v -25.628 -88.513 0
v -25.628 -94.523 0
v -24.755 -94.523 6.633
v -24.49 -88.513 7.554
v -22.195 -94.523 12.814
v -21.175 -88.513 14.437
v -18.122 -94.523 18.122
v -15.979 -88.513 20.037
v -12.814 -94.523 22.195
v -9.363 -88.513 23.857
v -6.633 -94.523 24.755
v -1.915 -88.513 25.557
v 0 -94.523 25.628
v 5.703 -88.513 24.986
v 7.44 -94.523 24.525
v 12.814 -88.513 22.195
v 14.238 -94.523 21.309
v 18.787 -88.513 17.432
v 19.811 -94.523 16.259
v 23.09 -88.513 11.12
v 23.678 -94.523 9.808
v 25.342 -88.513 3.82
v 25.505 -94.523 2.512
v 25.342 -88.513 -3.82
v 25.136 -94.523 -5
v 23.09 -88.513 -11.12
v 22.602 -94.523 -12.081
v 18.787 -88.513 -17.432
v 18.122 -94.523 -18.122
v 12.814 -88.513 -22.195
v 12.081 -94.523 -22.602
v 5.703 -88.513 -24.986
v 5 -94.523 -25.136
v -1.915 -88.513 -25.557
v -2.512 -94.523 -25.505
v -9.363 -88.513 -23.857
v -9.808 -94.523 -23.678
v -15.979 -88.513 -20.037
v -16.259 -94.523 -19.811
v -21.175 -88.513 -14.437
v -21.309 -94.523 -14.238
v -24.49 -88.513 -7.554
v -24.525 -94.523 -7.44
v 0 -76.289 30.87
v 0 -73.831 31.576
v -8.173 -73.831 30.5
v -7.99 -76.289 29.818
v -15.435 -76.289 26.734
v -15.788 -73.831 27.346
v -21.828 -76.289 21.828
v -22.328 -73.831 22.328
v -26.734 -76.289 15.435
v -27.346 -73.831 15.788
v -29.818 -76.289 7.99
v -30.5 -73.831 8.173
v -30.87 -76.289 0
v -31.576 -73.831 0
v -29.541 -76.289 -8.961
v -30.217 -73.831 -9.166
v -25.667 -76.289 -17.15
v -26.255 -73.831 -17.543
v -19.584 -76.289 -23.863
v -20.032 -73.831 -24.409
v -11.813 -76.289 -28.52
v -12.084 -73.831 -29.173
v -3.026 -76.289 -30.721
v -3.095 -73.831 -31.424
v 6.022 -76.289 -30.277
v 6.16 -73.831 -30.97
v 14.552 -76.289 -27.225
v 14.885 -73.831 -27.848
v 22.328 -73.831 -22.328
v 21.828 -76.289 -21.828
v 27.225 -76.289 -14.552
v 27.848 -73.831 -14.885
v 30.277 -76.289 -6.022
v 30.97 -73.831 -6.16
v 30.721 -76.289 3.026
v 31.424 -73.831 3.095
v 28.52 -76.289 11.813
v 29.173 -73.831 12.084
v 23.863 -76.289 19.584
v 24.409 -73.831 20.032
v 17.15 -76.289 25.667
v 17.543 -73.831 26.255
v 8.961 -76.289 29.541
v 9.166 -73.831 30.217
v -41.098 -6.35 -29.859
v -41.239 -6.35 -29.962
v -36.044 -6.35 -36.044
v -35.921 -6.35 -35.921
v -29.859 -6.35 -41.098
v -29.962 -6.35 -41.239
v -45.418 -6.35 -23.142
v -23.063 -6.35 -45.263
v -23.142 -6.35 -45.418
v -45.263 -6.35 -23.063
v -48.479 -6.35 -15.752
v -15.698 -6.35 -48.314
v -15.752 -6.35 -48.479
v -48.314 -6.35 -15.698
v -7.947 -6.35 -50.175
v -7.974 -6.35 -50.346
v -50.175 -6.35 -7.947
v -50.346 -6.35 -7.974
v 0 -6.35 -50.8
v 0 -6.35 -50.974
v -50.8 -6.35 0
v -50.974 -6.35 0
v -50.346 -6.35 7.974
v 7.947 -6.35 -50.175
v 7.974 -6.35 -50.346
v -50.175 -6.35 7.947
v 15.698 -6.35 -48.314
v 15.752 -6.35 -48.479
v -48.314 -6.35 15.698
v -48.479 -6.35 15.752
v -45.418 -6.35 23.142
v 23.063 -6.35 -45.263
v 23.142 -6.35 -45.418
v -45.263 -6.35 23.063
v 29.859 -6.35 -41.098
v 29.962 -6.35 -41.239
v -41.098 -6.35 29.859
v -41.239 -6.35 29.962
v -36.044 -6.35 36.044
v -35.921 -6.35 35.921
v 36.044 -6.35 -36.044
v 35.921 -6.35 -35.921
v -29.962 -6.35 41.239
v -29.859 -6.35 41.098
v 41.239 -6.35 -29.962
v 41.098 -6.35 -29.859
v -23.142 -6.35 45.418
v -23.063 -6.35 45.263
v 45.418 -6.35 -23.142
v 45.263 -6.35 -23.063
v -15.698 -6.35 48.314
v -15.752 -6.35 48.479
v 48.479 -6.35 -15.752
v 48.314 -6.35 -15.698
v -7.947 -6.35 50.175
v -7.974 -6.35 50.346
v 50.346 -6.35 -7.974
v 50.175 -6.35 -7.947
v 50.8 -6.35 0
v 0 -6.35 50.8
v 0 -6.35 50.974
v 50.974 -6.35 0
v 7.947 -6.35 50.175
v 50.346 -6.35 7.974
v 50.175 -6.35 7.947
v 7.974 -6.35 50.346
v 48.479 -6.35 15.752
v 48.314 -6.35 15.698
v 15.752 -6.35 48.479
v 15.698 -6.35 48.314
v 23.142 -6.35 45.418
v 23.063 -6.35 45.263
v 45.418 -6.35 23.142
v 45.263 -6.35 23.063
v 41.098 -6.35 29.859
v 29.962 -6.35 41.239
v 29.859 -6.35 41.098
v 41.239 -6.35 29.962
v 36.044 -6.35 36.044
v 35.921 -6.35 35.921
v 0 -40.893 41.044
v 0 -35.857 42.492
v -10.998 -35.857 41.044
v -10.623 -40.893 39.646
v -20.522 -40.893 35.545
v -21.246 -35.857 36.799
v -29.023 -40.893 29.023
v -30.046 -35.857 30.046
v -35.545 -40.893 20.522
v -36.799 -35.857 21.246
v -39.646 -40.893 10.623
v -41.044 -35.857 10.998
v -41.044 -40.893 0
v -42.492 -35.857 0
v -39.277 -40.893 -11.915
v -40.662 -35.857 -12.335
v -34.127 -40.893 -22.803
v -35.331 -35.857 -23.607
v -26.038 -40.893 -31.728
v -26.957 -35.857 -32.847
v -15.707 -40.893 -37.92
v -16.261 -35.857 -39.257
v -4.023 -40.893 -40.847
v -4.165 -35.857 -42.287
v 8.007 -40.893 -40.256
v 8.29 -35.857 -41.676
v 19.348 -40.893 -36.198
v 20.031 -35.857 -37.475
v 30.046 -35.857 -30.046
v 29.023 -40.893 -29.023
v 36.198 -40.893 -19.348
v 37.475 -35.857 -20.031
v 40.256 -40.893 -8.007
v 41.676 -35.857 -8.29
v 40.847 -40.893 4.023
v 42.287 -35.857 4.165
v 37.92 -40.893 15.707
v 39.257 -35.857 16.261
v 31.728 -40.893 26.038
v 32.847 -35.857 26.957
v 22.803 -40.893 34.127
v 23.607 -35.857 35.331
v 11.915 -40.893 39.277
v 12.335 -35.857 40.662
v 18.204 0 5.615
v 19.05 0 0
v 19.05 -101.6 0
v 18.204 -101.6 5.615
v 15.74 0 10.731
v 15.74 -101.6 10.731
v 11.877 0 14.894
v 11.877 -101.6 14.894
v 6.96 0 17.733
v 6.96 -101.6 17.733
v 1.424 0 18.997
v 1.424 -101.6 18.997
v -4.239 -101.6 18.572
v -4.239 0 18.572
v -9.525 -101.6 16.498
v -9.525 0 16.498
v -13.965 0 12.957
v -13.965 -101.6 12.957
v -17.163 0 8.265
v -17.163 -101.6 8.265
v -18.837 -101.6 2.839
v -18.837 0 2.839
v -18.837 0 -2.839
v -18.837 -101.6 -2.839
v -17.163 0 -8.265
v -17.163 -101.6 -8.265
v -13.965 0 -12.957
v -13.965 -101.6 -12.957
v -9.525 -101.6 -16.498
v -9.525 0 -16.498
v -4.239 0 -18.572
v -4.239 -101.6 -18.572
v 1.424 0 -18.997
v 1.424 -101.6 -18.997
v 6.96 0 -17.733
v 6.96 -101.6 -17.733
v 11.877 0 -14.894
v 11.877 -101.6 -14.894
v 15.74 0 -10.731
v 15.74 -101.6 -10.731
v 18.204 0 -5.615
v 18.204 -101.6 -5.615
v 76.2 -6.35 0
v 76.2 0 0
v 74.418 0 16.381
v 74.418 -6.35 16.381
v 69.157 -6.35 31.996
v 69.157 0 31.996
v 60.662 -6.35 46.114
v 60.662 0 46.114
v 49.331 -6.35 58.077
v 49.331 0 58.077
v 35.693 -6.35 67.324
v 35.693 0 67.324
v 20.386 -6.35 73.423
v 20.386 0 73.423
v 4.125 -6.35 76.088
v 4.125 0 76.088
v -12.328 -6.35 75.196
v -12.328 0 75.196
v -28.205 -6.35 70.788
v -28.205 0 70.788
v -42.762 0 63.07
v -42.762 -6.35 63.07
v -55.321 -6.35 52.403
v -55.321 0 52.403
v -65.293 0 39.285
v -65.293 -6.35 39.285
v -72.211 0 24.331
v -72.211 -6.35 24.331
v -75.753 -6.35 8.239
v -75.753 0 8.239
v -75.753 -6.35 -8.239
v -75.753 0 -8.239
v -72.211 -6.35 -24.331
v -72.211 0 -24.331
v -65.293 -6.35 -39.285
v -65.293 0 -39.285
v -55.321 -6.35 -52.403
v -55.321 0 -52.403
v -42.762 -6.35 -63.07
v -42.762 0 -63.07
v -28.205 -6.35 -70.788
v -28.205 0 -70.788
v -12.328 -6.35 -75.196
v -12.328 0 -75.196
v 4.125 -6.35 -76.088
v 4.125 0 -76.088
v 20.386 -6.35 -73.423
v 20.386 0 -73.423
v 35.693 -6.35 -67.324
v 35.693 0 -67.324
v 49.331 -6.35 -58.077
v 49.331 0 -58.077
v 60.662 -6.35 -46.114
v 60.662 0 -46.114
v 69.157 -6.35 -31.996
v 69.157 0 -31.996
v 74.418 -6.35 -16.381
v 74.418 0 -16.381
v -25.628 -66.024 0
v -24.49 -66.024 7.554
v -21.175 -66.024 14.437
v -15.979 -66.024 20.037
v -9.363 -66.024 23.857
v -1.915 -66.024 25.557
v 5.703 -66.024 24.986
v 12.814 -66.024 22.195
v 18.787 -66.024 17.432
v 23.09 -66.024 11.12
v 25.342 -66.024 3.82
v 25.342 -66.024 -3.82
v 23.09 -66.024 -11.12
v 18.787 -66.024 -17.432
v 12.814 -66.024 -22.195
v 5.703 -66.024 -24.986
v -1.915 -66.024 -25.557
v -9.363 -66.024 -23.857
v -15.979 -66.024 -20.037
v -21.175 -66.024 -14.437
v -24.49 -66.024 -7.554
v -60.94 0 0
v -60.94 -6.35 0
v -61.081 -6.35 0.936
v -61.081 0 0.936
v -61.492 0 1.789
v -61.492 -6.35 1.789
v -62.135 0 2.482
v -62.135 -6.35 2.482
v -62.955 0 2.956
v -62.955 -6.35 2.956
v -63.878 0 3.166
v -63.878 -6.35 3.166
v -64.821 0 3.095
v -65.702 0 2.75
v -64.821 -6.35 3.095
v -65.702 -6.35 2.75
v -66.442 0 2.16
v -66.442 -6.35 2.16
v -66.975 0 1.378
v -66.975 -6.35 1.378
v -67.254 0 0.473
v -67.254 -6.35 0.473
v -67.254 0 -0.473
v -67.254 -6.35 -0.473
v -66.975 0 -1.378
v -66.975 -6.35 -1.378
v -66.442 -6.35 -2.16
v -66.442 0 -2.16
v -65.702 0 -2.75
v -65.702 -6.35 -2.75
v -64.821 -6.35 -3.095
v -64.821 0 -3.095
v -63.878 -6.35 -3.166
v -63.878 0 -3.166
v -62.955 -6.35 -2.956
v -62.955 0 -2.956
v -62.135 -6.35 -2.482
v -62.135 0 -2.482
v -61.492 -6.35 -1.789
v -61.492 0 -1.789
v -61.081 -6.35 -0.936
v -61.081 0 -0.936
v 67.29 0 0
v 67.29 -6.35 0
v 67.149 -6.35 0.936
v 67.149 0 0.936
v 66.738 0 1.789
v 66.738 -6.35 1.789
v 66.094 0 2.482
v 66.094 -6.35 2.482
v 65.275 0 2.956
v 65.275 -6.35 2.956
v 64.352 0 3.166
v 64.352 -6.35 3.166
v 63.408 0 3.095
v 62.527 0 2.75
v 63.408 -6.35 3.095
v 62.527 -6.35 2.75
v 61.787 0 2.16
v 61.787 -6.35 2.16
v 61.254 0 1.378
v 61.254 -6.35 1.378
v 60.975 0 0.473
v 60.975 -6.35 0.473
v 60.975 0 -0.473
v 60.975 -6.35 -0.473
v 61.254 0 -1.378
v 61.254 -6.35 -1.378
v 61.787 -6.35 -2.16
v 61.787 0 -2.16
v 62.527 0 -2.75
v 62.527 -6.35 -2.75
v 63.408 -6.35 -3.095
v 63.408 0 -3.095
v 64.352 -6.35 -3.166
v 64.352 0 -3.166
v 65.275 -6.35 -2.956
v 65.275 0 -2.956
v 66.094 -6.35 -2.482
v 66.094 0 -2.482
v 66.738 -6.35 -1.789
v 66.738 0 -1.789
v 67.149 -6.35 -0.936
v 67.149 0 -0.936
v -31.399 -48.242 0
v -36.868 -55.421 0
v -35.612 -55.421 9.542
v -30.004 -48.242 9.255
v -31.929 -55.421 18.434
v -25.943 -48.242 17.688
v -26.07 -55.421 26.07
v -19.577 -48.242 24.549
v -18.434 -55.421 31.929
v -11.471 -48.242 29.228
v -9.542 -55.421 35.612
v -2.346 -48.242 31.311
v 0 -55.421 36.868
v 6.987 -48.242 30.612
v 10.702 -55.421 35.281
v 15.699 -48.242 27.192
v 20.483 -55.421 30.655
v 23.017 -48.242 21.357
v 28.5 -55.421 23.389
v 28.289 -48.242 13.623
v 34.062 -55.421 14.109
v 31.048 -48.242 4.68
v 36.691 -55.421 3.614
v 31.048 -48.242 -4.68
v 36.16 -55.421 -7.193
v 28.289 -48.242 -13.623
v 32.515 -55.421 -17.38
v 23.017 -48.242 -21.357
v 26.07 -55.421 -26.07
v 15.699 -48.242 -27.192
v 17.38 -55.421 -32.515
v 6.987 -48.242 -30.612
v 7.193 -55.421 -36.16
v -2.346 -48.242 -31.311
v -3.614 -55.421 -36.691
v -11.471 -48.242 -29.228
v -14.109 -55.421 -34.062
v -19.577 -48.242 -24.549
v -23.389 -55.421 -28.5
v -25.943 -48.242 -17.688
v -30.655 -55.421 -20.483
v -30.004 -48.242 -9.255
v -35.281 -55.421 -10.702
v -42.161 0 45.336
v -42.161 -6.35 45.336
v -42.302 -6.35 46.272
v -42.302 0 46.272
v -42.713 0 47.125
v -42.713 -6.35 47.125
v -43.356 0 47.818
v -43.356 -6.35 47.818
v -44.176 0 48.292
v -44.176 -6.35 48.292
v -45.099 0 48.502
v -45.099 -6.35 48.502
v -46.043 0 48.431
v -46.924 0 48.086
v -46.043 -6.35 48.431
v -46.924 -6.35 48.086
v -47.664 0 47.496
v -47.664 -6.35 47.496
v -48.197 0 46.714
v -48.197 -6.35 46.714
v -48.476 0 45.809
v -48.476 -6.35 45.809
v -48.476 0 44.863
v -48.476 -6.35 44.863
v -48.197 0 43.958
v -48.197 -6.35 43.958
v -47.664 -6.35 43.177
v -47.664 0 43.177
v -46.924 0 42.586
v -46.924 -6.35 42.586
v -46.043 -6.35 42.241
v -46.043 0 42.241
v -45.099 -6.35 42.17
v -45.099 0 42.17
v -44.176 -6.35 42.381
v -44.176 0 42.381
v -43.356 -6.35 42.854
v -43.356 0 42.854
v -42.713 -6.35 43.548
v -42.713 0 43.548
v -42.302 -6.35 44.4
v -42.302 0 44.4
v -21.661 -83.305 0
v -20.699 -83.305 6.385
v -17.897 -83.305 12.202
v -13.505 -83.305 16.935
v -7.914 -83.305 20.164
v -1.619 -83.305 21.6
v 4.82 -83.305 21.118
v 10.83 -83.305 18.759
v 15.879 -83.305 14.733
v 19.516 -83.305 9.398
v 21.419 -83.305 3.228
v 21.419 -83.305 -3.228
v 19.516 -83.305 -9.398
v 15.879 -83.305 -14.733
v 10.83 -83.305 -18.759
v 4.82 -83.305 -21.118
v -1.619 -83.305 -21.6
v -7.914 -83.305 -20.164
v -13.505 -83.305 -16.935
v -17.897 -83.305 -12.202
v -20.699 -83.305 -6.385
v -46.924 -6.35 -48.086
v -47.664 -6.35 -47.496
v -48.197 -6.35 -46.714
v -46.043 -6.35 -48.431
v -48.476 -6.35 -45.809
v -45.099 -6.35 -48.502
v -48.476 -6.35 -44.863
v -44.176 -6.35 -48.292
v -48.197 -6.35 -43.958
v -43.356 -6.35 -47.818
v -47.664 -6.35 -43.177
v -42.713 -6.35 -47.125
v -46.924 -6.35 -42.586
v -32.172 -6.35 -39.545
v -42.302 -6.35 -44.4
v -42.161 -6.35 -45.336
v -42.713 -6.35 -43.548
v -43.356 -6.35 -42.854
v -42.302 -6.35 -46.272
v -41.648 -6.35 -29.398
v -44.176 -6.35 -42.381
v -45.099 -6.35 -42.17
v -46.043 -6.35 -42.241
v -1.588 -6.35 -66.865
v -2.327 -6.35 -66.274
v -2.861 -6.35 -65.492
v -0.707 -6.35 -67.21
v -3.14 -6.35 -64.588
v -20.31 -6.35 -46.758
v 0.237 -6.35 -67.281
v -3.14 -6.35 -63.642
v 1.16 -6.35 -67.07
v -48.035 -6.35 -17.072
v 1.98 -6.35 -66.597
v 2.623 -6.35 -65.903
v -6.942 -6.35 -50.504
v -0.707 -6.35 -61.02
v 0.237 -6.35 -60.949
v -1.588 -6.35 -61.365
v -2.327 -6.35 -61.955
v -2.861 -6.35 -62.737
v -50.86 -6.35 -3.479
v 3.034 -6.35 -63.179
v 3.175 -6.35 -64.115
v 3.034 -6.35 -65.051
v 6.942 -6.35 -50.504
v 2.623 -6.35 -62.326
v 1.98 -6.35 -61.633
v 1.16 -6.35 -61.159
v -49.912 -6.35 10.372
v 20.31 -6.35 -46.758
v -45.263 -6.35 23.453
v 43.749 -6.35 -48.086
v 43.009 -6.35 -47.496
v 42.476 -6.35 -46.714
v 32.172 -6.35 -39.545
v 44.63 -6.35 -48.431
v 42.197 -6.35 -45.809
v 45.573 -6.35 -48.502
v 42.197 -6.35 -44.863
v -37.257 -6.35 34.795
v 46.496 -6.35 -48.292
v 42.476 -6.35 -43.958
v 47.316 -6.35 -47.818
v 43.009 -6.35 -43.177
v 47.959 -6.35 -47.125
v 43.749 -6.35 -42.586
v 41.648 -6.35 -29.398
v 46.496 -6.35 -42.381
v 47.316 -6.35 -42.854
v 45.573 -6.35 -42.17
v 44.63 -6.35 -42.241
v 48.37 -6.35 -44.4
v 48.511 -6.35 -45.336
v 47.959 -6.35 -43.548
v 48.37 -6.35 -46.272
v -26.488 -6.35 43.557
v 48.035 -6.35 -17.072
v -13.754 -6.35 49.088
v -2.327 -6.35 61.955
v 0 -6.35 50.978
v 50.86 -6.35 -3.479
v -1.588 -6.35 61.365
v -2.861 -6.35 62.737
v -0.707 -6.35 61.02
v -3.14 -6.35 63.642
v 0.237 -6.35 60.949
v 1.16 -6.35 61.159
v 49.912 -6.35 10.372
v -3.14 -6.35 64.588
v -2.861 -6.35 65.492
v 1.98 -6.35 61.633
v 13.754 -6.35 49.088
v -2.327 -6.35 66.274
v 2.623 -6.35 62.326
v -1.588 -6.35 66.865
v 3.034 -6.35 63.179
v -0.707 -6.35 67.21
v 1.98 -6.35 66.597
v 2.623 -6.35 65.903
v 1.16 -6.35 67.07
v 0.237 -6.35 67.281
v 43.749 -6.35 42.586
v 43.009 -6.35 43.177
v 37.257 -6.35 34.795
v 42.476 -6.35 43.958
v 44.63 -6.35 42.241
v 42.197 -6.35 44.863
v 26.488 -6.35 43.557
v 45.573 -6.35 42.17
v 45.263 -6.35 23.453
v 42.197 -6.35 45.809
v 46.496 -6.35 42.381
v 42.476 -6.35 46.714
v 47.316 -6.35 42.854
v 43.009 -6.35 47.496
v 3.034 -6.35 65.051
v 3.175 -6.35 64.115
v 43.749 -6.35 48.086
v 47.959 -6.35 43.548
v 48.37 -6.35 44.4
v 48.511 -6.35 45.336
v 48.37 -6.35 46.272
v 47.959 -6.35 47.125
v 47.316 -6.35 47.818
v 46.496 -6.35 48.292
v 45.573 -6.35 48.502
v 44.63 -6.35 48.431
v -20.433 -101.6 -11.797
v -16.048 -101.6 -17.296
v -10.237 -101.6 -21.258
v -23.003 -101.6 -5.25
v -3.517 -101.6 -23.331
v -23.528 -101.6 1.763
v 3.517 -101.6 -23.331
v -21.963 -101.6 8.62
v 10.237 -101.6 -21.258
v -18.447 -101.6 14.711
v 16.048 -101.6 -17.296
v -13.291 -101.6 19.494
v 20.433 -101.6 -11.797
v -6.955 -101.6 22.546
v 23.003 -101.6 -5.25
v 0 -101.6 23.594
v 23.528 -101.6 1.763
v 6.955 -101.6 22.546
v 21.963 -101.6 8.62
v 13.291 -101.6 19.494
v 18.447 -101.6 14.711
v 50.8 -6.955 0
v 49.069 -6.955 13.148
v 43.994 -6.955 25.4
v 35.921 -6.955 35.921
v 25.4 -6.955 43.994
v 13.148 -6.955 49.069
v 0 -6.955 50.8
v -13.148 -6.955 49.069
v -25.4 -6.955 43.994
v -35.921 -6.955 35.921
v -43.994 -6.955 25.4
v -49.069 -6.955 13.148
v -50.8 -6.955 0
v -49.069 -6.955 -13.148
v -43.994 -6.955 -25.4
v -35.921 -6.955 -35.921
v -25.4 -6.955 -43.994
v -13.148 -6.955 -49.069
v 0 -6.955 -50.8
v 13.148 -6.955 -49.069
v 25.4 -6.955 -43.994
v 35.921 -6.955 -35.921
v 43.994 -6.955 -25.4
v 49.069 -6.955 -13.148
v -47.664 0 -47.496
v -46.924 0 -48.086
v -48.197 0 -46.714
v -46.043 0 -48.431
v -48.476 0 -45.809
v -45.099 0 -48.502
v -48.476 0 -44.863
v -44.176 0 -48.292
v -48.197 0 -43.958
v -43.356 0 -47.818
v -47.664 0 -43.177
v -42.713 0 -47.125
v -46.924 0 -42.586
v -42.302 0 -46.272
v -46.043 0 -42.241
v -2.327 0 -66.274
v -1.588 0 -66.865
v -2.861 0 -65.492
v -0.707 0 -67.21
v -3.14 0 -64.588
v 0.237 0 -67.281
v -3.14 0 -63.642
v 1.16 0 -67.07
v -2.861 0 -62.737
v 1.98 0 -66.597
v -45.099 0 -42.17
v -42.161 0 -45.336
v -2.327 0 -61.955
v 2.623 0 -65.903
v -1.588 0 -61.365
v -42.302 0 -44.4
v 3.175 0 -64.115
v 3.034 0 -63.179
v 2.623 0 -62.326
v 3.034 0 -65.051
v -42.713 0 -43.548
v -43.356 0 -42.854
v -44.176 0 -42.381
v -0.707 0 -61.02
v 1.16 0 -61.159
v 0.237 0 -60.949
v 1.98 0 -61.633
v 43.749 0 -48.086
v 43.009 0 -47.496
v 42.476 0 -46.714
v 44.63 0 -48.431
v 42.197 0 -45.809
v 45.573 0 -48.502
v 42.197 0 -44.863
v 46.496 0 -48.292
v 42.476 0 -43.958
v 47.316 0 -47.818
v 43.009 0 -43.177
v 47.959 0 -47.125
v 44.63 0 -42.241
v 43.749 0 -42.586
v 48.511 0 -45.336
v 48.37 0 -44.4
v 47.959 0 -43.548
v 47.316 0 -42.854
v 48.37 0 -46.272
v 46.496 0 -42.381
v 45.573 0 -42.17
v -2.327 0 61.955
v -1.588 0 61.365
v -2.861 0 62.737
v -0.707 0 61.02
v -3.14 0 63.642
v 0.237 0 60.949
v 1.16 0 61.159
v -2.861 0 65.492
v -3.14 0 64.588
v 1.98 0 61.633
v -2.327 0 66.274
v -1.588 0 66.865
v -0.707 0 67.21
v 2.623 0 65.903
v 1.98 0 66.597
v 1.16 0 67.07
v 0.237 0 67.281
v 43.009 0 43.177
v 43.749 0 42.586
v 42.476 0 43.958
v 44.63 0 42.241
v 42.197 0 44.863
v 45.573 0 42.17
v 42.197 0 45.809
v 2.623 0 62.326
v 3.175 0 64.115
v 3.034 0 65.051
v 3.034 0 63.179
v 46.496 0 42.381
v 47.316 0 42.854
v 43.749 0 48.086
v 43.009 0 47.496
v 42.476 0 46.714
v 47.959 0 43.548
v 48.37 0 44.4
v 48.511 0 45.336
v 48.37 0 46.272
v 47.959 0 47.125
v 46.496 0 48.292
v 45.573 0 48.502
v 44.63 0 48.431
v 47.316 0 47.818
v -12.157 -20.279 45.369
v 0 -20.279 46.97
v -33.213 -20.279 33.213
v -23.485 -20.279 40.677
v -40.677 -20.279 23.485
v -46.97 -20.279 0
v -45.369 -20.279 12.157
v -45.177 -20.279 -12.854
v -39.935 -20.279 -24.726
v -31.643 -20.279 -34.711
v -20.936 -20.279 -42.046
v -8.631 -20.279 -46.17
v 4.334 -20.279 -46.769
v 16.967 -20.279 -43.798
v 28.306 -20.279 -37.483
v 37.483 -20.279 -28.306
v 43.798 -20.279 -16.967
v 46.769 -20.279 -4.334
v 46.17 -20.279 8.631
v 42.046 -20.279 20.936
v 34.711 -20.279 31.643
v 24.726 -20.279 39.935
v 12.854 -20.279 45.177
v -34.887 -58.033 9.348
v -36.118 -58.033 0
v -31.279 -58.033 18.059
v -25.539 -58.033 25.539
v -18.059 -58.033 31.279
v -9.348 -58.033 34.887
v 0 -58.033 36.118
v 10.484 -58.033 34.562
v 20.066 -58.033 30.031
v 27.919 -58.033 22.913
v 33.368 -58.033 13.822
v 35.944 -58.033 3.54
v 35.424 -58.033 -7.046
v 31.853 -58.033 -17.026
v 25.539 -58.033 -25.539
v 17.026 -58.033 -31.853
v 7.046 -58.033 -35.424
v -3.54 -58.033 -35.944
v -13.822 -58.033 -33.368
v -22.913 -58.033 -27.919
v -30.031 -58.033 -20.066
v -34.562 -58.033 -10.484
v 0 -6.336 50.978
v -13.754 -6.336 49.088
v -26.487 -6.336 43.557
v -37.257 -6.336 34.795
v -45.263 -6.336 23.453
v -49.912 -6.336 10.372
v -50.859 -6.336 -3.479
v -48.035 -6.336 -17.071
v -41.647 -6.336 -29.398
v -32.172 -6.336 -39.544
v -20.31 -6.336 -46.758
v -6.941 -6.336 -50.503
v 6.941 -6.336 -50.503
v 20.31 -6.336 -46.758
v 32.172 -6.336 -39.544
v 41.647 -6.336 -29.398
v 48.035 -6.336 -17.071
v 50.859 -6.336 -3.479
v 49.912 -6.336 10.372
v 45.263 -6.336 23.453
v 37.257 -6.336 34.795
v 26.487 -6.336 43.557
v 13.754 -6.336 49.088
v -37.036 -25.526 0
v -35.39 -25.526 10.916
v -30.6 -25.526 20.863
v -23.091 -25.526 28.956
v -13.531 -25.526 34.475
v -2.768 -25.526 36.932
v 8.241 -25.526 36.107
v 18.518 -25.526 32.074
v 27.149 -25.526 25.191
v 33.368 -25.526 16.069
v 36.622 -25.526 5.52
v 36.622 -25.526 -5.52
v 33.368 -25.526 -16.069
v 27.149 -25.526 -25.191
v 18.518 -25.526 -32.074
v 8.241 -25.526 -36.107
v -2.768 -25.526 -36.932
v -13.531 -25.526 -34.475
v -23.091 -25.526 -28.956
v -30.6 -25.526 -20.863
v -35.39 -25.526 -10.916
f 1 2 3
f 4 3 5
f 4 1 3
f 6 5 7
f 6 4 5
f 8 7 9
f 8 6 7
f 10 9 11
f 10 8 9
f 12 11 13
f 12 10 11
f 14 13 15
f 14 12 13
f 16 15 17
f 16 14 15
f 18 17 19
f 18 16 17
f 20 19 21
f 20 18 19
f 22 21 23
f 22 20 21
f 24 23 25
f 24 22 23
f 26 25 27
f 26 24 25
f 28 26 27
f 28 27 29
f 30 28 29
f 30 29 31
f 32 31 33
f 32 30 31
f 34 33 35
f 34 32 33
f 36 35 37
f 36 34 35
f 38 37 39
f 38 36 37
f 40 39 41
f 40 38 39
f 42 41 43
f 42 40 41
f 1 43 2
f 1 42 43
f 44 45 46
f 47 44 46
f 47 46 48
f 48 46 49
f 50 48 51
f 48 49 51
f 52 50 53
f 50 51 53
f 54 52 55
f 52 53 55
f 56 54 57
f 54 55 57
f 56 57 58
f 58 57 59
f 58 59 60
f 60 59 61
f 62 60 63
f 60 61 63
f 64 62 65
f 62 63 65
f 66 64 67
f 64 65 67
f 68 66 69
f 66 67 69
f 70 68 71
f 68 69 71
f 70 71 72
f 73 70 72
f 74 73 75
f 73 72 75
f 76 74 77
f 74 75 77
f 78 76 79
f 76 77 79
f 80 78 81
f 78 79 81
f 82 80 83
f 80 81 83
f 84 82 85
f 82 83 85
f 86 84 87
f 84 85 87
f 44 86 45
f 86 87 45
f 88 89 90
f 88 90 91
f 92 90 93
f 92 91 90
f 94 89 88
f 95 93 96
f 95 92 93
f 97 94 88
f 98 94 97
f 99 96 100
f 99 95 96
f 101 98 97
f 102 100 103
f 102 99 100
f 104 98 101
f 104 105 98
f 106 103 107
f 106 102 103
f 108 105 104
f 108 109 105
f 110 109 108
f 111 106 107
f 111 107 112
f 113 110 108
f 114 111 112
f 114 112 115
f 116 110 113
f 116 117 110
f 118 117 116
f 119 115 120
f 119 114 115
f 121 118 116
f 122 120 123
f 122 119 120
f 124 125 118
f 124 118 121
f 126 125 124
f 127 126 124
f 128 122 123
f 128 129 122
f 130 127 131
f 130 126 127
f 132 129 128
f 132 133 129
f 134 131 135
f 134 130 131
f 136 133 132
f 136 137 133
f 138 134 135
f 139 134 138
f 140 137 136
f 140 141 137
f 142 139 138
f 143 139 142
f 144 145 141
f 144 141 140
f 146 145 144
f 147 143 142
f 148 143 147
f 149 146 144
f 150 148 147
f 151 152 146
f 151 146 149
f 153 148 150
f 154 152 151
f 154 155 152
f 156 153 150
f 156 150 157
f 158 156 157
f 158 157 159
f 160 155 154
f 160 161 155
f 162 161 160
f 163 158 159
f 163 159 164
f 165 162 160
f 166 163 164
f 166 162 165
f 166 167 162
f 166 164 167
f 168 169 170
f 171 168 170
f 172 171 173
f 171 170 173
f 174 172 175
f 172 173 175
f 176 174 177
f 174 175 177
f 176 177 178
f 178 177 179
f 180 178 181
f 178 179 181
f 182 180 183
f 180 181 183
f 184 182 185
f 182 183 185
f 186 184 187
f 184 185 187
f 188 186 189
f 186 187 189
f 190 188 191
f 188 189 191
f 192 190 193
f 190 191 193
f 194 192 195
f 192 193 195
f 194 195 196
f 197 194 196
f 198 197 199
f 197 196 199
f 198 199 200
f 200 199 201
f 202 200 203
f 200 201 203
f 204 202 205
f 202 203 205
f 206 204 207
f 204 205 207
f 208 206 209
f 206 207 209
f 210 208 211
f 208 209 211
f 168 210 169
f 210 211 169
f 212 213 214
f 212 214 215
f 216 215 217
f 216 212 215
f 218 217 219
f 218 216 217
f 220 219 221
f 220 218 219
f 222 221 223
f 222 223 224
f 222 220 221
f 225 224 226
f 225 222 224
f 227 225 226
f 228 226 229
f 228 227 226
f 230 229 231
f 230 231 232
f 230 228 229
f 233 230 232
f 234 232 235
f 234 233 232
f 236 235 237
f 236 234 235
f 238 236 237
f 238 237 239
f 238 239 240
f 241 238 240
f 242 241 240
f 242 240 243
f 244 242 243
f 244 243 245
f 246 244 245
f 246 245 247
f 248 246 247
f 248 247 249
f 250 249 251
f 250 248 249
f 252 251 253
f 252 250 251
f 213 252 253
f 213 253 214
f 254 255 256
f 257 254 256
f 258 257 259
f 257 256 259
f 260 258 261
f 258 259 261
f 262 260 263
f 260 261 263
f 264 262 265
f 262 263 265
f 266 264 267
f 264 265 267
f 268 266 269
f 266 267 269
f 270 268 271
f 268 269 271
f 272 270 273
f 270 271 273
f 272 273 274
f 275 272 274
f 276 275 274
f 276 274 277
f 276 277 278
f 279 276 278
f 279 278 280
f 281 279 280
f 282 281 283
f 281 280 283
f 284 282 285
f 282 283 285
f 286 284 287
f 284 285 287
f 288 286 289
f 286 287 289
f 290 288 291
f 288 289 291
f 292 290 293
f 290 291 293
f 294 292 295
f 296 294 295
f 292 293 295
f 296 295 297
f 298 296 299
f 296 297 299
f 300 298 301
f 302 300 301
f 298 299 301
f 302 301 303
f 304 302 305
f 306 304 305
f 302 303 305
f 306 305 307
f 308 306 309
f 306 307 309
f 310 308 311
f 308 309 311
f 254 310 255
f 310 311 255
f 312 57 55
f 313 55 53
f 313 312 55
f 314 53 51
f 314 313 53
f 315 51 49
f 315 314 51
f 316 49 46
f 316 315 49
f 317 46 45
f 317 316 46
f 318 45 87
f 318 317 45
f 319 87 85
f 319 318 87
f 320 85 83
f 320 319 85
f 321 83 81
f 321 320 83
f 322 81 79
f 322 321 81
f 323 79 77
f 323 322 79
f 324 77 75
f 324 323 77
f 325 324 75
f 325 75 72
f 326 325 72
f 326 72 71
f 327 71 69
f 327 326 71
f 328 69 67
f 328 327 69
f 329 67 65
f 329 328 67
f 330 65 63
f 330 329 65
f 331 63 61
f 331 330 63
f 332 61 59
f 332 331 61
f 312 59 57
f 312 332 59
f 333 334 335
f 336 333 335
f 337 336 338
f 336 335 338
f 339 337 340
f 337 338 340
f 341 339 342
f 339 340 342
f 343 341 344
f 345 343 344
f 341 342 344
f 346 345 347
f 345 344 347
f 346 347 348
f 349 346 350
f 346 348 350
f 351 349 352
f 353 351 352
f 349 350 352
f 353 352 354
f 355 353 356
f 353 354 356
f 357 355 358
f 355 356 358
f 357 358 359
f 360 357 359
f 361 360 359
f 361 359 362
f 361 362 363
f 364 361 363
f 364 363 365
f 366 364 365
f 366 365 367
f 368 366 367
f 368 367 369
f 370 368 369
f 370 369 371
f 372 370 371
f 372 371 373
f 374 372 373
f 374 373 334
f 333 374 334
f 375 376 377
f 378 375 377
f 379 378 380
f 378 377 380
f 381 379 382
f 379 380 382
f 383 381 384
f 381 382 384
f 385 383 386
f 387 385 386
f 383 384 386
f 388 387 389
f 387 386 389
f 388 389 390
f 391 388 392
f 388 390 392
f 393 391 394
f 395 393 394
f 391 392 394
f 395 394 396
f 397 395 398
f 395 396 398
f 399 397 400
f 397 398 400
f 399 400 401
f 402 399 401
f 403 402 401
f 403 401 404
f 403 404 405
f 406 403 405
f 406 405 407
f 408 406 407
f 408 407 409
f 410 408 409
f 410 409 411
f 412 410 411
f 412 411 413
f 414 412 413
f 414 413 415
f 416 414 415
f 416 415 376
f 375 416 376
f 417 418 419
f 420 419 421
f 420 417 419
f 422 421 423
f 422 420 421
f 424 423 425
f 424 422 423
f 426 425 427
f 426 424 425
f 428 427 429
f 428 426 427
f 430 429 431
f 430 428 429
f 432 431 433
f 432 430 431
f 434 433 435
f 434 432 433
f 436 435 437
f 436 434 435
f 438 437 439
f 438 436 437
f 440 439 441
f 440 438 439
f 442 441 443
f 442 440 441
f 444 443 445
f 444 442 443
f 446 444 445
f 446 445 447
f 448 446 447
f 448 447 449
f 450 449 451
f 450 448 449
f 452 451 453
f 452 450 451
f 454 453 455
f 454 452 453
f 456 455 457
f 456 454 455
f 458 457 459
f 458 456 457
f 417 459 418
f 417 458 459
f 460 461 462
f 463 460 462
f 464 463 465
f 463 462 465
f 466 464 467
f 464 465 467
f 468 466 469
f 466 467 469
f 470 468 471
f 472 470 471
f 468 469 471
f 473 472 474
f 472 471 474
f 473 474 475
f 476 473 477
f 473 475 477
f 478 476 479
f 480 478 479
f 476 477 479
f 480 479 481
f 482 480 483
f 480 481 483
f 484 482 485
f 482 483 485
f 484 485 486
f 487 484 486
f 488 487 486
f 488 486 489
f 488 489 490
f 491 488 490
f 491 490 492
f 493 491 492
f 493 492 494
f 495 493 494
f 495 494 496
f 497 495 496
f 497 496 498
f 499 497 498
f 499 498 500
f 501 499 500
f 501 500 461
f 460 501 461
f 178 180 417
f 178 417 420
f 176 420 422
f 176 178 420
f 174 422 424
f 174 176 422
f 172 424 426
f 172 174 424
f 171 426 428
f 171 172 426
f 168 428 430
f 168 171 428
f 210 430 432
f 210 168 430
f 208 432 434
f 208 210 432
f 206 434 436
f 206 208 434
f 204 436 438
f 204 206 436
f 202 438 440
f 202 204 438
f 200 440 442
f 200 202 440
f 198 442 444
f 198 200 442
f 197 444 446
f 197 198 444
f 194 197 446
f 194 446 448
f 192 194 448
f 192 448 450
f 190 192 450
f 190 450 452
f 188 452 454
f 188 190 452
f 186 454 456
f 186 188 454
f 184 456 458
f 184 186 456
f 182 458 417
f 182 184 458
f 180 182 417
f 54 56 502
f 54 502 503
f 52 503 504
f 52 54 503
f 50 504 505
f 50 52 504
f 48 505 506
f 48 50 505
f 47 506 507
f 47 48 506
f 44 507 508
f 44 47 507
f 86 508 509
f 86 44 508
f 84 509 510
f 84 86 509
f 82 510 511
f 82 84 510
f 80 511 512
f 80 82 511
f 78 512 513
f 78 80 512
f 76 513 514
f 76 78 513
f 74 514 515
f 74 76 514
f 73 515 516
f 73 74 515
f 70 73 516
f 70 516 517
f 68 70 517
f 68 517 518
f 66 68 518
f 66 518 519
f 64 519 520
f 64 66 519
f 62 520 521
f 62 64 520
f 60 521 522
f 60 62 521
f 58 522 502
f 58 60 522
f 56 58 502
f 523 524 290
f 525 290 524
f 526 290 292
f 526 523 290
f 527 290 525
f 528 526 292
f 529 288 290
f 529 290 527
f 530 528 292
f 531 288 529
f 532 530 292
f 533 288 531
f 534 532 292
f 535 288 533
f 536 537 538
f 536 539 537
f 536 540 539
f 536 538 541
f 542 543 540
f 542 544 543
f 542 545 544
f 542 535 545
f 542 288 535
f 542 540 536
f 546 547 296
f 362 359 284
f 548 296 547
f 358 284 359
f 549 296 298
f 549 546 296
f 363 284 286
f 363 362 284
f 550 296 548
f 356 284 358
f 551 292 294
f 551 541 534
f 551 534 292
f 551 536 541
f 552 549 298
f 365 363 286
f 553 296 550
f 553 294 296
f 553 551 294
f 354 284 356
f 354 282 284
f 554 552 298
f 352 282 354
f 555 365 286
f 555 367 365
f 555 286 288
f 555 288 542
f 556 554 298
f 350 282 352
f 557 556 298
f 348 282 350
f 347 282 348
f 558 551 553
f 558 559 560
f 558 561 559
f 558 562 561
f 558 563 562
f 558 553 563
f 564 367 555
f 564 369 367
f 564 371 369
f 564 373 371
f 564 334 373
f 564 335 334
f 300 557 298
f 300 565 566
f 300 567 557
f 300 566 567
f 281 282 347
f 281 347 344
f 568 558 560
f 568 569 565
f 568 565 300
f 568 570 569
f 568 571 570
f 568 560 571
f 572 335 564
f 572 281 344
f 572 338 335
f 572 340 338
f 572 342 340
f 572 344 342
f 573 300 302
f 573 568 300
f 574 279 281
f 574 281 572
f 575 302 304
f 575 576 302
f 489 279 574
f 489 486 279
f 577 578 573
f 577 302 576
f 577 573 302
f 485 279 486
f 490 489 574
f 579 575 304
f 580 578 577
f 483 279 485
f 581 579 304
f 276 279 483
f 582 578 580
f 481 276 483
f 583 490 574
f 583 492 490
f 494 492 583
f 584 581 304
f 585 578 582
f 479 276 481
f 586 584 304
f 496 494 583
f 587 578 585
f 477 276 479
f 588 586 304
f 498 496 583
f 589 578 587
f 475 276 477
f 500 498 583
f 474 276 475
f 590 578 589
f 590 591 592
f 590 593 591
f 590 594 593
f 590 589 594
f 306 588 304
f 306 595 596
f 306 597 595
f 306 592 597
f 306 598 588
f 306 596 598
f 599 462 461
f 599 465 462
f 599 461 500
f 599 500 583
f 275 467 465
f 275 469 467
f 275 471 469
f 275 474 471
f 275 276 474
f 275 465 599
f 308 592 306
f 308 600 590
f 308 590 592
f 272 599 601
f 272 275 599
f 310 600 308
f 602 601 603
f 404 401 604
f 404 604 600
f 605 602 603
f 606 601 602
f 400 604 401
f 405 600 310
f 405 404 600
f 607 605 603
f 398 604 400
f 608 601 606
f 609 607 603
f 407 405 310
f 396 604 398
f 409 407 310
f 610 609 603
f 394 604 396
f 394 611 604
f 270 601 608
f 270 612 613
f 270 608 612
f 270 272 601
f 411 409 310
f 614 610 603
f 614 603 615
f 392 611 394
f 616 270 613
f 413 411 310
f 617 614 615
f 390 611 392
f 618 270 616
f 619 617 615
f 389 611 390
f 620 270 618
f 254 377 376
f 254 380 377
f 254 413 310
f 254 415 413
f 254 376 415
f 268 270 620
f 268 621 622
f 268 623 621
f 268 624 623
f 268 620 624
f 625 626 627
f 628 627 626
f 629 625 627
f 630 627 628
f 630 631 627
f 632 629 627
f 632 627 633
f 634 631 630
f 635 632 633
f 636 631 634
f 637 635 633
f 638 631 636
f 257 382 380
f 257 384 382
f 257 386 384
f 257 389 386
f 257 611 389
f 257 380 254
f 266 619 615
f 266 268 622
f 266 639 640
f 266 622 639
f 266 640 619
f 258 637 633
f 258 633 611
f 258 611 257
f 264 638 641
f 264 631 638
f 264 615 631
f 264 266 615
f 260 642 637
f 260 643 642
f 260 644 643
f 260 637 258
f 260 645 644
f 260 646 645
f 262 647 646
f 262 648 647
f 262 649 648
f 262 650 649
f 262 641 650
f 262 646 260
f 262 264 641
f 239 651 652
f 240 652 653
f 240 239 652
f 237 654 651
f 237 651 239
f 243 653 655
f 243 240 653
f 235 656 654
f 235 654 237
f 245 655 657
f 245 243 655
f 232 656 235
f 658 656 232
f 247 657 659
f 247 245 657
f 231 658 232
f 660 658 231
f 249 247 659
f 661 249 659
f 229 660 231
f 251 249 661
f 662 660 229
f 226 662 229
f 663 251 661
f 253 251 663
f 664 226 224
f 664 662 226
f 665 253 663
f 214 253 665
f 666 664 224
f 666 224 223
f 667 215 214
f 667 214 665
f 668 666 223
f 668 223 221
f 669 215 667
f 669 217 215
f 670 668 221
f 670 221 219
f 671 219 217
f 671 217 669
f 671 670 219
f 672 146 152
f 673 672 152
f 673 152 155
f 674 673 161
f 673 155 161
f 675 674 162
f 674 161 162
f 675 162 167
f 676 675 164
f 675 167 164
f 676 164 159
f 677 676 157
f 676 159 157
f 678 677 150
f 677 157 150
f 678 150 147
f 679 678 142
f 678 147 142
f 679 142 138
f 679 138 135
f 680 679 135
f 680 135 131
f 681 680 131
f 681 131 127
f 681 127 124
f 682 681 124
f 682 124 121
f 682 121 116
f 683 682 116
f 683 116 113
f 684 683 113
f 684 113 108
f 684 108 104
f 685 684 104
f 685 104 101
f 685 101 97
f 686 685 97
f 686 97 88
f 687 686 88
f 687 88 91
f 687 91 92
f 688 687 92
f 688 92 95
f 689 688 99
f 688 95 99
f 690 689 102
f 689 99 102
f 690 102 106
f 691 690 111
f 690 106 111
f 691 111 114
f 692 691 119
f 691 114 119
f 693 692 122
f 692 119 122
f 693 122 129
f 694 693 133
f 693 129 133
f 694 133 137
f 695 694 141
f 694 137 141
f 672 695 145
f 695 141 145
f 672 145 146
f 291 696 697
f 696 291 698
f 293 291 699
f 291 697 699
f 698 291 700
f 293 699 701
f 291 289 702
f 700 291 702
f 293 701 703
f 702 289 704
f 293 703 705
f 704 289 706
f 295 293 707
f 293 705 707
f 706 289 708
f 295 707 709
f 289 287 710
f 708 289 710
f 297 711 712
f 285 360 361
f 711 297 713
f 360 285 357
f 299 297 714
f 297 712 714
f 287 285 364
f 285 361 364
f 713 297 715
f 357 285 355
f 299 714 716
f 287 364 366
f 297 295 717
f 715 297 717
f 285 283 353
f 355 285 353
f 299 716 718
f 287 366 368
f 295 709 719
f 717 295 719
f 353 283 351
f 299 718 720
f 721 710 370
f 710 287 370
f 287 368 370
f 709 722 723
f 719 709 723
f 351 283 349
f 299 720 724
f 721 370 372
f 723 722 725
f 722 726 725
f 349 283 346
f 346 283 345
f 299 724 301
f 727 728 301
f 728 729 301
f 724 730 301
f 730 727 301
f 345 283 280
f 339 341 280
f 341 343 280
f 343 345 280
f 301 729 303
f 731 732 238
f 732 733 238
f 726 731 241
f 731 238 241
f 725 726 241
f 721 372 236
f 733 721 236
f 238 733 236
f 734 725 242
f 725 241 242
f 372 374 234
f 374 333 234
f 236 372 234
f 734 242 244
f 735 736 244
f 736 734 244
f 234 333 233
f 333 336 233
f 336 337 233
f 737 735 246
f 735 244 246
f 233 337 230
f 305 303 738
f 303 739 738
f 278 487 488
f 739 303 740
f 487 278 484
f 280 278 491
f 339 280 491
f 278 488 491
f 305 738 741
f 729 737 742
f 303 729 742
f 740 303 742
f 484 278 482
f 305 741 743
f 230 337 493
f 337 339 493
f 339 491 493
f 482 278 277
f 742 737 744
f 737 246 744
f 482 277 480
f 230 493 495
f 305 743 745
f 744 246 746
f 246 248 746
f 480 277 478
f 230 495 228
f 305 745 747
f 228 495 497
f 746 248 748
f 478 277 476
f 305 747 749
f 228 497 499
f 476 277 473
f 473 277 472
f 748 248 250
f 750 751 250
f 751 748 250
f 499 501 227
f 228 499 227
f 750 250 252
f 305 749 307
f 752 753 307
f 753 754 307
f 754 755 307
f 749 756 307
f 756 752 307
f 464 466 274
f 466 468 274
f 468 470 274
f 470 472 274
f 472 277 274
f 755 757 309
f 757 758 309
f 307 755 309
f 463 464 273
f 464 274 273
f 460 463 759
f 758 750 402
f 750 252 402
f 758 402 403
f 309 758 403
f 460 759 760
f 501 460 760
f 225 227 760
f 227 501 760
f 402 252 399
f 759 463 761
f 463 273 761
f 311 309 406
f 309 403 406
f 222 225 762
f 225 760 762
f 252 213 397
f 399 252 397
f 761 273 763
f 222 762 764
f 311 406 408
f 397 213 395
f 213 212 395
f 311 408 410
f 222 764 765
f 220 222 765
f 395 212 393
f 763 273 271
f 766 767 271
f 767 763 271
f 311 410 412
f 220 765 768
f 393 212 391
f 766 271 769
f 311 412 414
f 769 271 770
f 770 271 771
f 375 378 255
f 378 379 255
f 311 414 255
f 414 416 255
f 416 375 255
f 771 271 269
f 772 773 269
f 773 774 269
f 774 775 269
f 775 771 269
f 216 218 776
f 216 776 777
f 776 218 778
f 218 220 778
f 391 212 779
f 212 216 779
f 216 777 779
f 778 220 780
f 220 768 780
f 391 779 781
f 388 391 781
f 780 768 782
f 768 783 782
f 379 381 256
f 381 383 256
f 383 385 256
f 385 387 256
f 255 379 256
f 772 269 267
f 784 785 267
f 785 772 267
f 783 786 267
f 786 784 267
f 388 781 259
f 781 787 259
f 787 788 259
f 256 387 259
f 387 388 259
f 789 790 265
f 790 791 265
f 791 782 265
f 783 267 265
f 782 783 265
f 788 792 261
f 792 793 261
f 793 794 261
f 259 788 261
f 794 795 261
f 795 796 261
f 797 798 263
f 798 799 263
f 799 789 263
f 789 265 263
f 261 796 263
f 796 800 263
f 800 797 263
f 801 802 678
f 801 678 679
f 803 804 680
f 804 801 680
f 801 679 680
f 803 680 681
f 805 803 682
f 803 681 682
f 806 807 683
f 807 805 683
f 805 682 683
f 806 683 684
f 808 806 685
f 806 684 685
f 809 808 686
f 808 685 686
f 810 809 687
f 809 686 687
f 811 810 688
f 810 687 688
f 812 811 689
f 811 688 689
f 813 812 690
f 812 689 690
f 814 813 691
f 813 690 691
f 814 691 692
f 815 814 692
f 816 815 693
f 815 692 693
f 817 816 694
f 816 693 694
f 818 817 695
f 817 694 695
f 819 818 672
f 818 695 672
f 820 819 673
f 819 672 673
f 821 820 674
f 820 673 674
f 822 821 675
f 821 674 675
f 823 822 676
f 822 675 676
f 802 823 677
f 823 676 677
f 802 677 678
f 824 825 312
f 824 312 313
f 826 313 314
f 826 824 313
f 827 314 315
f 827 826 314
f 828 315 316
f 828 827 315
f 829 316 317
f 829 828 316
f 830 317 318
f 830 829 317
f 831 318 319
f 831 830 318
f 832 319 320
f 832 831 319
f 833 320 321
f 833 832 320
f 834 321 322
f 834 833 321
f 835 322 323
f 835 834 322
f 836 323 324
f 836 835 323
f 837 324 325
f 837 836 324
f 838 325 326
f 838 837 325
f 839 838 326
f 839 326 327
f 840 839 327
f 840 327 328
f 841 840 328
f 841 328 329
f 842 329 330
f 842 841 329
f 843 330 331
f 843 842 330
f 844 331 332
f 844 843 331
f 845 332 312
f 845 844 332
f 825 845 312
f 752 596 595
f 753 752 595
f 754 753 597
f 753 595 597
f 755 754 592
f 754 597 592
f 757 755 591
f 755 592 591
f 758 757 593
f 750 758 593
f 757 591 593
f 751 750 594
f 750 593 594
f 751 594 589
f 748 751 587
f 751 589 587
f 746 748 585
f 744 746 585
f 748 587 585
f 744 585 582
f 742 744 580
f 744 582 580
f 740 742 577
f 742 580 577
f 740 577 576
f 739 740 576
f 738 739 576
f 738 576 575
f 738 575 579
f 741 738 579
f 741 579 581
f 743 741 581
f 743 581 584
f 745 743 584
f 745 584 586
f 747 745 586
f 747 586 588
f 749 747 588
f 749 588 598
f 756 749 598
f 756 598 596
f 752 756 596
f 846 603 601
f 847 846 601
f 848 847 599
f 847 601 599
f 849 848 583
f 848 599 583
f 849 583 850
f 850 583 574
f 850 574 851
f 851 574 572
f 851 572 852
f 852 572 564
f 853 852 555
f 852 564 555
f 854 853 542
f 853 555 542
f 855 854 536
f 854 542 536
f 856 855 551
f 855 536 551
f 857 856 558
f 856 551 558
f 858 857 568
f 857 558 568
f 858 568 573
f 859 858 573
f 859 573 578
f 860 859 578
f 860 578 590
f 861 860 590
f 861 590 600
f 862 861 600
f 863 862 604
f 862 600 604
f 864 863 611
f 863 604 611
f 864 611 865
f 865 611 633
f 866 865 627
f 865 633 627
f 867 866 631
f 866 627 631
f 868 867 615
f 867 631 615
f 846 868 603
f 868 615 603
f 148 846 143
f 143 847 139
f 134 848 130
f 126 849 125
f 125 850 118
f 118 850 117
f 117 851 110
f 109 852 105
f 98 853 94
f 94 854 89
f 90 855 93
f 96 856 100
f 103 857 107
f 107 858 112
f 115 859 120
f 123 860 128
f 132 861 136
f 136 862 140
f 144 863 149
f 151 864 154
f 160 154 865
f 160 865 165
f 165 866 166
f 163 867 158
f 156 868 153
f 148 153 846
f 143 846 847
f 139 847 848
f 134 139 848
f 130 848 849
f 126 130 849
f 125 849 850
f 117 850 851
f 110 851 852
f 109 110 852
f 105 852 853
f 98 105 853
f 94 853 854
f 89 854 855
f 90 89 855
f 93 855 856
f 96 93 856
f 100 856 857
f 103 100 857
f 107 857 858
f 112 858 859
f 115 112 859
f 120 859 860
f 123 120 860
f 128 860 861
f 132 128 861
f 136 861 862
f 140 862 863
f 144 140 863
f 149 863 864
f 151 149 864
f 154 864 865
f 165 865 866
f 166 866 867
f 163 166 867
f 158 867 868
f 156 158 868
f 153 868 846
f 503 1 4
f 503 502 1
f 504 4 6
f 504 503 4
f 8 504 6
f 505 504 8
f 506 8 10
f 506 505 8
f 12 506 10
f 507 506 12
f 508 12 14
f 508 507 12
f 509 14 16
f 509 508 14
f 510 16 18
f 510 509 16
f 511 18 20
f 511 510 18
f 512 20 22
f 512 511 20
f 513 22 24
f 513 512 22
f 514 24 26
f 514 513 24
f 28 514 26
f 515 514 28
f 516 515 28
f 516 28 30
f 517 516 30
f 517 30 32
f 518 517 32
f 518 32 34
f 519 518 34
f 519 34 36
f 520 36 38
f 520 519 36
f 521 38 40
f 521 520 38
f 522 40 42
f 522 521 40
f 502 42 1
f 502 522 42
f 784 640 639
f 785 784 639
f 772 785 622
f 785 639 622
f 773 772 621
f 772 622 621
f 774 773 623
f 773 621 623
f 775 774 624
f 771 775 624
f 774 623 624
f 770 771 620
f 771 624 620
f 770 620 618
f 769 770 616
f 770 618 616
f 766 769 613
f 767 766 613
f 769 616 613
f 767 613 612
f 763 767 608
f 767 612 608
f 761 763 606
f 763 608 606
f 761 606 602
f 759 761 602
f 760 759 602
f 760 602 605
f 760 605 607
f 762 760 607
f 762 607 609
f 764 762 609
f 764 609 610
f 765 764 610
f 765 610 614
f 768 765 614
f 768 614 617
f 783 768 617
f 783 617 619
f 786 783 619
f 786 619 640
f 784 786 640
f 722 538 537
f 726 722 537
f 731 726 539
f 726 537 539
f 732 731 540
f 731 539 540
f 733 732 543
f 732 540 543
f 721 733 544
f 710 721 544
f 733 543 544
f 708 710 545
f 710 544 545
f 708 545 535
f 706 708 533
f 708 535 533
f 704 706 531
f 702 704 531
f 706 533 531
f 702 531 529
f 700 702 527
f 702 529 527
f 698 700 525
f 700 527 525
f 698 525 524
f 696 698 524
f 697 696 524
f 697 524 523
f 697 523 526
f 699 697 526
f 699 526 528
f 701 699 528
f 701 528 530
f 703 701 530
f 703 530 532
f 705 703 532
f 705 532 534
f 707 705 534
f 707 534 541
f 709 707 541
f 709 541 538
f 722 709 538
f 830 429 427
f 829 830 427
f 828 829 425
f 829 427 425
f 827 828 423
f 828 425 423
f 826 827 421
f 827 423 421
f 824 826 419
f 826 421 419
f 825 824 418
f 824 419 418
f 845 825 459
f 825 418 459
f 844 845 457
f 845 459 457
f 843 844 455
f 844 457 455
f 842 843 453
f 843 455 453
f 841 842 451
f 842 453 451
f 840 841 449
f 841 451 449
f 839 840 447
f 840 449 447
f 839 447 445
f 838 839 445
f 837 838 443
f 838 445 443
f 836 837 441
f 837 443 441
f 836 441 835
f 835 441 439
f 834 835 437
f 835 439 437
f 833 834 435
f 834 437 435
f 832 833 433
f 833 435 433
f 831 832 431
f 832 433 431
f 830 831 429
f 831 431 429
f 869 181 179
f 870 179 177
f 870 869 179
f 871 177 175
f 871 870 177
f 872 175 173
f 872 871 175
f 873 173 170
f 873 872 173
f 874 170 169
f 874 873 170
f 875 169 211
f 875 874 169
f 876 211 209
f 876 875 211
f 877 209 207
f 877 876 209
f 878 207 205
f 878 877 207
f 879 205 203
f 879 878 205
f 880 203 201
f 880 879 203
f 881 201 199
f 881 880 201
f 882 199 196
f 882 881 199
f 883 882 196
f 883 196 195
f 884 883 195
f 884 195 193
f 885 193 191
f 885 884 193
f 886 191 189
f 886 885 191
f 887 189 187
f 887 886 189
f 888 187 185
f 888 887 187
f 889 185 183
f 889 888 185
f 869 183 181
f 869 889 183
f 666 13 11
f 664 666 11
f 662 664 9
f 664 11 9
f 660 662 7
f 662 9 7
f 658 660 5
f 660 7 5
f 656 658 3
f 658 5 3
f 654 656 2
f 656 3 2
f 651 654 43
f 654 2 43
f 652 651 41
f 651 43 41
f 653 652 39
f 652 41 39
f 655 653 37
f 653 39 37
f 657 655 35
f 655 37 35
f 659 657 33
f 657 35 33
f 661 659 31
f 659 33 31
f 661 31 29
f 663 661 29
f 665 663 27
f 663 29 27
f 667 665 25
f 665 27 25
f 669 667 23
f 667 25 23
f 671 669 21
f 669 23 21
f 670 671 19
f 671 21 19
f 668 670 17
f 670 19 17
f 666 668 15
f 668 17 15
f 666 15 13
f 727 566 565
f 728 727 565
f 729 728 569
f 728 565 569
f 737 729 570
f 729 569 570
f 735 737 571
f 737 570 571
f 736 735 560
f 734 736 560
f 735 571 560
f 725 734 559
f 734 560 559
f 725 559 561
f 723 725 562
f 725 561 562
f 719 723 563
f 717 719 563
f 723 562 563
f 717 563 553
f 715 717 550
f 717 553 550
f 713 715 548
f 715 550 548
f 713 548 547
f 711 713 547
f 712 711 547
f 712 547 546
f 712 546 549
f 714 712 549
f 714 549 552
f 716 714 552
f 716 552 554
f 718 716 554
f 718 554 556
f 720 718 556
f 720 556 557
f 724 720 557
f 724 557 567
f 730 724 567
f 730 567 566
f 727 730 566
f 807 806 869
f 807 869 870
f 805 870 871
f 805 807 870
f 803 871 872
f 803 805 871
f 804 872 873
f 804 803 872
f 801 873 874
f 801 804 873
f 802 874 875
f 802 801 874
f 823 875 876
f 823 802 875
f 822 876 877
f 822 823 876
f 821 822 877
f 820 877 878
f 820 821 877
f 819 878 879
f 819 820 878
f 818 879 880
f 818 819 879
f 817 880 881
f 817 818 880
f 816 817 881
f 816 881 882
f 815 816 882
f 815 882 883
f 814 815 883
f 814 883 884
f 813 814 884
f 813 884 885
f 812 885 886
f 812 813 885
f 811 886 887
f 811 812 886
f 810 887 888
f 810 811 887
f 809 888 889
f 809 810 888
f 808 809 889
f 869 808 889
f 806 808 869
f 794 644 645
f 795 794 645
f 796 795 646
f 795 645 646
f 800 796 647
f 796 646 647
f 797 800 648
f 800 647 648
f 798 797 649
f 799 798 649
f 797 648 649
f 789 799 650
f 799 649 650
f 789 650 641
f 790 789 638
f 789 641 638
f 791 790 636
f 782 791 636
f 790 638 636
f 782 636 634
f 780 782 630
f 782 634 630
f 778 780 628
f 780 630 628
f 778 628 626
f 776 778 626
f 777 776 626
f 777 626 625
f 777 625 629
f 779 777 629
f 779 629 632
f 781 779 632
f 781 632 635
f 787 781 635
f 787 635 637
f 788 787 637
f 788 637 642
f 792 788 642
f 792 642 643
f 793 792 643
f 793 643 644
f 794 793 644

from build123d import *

# Parameters (mm, degrees)
F0_R     = 50.8
F0_R_2   = 19.05
F1_DEPTH = 101.6
F0_R_3   = 76.2
F2_DEPTH = 6.35
F7_R     = 3.175
F8_DEPTH = 25.4


with BuildPart() as f1:
    # F0 (on Front) → F1 (new body)
    with BuildSketch(Plane.XZ):
        Circle(F0_R)
        Circle(F0_R_2, mode=Mode.SUBTRACT)
    extrude(amount=F1_DEPTH)

    # F0 (on Front) → F2 (join)
    with BuildSketch(Plane.XZ):
        Circle(F0_R_3)
        Circle(F0_R, mode=Mode.SUBTRACT)
    extrude(amount=F2_DEPTH)

    # F3 (on Right) → F4 (revolve, cut)
    with BuildSketch(Plane.YZ):
        Polygon((-109.346762, 21.367406), (-6.33552, 50.977927), (-107.67857, 54.314323), align=None)
    revolve(axis=Axis((0, -101.6, 0), (0, -1, 0)), mode=Mode.SUBTRACT)

    # F5 (on Top) → F6 (revolve, cut)
    with BuildSketch(Plane.XY):
        Polygon((-55.385999, -52.059986), (-25.6285, -95.704317), (-25.6285, -88.51292), (-21.660833, -83.305359), (-32.501825, -75.045552), (-25.6285, -66.024315), (-37.851702, -56.711396), (-31.398905, -48.242103), (-43.97326, -38.661638), (-37.03554, -25.526214), (-49.323034, -19.036344), (-52.410249, -6.6798), align=None)
    revolve(axis=Axis((0, -101.6, 0), (0, 1, 0)), mode=Mode.SUBTRACT)

    # F7 (on face) → F8 (cut)
    with BuildSketch(Plane.XZ.offset(6.35)):
        with Locations((0, 64.114898)):
            Circle(F7_R)
        with Locations((45.336079, 45.336079)):
            Circle(F7_R)
        with Locations((-45.336079, 45.336079)):
            Circle(F7_R)
        with Locations((-64.114898, 0)):
            Circle(F7_R)
        with Locations((64.114898, 0)):
            Circle(F7_R)
        with Locations((45.336079, -45.336079)):
            Circle(F7_R)
        with Locations((0, -64.114898)):
            Circle(F7_R)
        with Locations((-45.336079, -45.336079)):
            Circle(F7_R)
    extrude(amount=-F8_DEPTH, mode=Mode.SUBTRACT)


solid = f1.part
